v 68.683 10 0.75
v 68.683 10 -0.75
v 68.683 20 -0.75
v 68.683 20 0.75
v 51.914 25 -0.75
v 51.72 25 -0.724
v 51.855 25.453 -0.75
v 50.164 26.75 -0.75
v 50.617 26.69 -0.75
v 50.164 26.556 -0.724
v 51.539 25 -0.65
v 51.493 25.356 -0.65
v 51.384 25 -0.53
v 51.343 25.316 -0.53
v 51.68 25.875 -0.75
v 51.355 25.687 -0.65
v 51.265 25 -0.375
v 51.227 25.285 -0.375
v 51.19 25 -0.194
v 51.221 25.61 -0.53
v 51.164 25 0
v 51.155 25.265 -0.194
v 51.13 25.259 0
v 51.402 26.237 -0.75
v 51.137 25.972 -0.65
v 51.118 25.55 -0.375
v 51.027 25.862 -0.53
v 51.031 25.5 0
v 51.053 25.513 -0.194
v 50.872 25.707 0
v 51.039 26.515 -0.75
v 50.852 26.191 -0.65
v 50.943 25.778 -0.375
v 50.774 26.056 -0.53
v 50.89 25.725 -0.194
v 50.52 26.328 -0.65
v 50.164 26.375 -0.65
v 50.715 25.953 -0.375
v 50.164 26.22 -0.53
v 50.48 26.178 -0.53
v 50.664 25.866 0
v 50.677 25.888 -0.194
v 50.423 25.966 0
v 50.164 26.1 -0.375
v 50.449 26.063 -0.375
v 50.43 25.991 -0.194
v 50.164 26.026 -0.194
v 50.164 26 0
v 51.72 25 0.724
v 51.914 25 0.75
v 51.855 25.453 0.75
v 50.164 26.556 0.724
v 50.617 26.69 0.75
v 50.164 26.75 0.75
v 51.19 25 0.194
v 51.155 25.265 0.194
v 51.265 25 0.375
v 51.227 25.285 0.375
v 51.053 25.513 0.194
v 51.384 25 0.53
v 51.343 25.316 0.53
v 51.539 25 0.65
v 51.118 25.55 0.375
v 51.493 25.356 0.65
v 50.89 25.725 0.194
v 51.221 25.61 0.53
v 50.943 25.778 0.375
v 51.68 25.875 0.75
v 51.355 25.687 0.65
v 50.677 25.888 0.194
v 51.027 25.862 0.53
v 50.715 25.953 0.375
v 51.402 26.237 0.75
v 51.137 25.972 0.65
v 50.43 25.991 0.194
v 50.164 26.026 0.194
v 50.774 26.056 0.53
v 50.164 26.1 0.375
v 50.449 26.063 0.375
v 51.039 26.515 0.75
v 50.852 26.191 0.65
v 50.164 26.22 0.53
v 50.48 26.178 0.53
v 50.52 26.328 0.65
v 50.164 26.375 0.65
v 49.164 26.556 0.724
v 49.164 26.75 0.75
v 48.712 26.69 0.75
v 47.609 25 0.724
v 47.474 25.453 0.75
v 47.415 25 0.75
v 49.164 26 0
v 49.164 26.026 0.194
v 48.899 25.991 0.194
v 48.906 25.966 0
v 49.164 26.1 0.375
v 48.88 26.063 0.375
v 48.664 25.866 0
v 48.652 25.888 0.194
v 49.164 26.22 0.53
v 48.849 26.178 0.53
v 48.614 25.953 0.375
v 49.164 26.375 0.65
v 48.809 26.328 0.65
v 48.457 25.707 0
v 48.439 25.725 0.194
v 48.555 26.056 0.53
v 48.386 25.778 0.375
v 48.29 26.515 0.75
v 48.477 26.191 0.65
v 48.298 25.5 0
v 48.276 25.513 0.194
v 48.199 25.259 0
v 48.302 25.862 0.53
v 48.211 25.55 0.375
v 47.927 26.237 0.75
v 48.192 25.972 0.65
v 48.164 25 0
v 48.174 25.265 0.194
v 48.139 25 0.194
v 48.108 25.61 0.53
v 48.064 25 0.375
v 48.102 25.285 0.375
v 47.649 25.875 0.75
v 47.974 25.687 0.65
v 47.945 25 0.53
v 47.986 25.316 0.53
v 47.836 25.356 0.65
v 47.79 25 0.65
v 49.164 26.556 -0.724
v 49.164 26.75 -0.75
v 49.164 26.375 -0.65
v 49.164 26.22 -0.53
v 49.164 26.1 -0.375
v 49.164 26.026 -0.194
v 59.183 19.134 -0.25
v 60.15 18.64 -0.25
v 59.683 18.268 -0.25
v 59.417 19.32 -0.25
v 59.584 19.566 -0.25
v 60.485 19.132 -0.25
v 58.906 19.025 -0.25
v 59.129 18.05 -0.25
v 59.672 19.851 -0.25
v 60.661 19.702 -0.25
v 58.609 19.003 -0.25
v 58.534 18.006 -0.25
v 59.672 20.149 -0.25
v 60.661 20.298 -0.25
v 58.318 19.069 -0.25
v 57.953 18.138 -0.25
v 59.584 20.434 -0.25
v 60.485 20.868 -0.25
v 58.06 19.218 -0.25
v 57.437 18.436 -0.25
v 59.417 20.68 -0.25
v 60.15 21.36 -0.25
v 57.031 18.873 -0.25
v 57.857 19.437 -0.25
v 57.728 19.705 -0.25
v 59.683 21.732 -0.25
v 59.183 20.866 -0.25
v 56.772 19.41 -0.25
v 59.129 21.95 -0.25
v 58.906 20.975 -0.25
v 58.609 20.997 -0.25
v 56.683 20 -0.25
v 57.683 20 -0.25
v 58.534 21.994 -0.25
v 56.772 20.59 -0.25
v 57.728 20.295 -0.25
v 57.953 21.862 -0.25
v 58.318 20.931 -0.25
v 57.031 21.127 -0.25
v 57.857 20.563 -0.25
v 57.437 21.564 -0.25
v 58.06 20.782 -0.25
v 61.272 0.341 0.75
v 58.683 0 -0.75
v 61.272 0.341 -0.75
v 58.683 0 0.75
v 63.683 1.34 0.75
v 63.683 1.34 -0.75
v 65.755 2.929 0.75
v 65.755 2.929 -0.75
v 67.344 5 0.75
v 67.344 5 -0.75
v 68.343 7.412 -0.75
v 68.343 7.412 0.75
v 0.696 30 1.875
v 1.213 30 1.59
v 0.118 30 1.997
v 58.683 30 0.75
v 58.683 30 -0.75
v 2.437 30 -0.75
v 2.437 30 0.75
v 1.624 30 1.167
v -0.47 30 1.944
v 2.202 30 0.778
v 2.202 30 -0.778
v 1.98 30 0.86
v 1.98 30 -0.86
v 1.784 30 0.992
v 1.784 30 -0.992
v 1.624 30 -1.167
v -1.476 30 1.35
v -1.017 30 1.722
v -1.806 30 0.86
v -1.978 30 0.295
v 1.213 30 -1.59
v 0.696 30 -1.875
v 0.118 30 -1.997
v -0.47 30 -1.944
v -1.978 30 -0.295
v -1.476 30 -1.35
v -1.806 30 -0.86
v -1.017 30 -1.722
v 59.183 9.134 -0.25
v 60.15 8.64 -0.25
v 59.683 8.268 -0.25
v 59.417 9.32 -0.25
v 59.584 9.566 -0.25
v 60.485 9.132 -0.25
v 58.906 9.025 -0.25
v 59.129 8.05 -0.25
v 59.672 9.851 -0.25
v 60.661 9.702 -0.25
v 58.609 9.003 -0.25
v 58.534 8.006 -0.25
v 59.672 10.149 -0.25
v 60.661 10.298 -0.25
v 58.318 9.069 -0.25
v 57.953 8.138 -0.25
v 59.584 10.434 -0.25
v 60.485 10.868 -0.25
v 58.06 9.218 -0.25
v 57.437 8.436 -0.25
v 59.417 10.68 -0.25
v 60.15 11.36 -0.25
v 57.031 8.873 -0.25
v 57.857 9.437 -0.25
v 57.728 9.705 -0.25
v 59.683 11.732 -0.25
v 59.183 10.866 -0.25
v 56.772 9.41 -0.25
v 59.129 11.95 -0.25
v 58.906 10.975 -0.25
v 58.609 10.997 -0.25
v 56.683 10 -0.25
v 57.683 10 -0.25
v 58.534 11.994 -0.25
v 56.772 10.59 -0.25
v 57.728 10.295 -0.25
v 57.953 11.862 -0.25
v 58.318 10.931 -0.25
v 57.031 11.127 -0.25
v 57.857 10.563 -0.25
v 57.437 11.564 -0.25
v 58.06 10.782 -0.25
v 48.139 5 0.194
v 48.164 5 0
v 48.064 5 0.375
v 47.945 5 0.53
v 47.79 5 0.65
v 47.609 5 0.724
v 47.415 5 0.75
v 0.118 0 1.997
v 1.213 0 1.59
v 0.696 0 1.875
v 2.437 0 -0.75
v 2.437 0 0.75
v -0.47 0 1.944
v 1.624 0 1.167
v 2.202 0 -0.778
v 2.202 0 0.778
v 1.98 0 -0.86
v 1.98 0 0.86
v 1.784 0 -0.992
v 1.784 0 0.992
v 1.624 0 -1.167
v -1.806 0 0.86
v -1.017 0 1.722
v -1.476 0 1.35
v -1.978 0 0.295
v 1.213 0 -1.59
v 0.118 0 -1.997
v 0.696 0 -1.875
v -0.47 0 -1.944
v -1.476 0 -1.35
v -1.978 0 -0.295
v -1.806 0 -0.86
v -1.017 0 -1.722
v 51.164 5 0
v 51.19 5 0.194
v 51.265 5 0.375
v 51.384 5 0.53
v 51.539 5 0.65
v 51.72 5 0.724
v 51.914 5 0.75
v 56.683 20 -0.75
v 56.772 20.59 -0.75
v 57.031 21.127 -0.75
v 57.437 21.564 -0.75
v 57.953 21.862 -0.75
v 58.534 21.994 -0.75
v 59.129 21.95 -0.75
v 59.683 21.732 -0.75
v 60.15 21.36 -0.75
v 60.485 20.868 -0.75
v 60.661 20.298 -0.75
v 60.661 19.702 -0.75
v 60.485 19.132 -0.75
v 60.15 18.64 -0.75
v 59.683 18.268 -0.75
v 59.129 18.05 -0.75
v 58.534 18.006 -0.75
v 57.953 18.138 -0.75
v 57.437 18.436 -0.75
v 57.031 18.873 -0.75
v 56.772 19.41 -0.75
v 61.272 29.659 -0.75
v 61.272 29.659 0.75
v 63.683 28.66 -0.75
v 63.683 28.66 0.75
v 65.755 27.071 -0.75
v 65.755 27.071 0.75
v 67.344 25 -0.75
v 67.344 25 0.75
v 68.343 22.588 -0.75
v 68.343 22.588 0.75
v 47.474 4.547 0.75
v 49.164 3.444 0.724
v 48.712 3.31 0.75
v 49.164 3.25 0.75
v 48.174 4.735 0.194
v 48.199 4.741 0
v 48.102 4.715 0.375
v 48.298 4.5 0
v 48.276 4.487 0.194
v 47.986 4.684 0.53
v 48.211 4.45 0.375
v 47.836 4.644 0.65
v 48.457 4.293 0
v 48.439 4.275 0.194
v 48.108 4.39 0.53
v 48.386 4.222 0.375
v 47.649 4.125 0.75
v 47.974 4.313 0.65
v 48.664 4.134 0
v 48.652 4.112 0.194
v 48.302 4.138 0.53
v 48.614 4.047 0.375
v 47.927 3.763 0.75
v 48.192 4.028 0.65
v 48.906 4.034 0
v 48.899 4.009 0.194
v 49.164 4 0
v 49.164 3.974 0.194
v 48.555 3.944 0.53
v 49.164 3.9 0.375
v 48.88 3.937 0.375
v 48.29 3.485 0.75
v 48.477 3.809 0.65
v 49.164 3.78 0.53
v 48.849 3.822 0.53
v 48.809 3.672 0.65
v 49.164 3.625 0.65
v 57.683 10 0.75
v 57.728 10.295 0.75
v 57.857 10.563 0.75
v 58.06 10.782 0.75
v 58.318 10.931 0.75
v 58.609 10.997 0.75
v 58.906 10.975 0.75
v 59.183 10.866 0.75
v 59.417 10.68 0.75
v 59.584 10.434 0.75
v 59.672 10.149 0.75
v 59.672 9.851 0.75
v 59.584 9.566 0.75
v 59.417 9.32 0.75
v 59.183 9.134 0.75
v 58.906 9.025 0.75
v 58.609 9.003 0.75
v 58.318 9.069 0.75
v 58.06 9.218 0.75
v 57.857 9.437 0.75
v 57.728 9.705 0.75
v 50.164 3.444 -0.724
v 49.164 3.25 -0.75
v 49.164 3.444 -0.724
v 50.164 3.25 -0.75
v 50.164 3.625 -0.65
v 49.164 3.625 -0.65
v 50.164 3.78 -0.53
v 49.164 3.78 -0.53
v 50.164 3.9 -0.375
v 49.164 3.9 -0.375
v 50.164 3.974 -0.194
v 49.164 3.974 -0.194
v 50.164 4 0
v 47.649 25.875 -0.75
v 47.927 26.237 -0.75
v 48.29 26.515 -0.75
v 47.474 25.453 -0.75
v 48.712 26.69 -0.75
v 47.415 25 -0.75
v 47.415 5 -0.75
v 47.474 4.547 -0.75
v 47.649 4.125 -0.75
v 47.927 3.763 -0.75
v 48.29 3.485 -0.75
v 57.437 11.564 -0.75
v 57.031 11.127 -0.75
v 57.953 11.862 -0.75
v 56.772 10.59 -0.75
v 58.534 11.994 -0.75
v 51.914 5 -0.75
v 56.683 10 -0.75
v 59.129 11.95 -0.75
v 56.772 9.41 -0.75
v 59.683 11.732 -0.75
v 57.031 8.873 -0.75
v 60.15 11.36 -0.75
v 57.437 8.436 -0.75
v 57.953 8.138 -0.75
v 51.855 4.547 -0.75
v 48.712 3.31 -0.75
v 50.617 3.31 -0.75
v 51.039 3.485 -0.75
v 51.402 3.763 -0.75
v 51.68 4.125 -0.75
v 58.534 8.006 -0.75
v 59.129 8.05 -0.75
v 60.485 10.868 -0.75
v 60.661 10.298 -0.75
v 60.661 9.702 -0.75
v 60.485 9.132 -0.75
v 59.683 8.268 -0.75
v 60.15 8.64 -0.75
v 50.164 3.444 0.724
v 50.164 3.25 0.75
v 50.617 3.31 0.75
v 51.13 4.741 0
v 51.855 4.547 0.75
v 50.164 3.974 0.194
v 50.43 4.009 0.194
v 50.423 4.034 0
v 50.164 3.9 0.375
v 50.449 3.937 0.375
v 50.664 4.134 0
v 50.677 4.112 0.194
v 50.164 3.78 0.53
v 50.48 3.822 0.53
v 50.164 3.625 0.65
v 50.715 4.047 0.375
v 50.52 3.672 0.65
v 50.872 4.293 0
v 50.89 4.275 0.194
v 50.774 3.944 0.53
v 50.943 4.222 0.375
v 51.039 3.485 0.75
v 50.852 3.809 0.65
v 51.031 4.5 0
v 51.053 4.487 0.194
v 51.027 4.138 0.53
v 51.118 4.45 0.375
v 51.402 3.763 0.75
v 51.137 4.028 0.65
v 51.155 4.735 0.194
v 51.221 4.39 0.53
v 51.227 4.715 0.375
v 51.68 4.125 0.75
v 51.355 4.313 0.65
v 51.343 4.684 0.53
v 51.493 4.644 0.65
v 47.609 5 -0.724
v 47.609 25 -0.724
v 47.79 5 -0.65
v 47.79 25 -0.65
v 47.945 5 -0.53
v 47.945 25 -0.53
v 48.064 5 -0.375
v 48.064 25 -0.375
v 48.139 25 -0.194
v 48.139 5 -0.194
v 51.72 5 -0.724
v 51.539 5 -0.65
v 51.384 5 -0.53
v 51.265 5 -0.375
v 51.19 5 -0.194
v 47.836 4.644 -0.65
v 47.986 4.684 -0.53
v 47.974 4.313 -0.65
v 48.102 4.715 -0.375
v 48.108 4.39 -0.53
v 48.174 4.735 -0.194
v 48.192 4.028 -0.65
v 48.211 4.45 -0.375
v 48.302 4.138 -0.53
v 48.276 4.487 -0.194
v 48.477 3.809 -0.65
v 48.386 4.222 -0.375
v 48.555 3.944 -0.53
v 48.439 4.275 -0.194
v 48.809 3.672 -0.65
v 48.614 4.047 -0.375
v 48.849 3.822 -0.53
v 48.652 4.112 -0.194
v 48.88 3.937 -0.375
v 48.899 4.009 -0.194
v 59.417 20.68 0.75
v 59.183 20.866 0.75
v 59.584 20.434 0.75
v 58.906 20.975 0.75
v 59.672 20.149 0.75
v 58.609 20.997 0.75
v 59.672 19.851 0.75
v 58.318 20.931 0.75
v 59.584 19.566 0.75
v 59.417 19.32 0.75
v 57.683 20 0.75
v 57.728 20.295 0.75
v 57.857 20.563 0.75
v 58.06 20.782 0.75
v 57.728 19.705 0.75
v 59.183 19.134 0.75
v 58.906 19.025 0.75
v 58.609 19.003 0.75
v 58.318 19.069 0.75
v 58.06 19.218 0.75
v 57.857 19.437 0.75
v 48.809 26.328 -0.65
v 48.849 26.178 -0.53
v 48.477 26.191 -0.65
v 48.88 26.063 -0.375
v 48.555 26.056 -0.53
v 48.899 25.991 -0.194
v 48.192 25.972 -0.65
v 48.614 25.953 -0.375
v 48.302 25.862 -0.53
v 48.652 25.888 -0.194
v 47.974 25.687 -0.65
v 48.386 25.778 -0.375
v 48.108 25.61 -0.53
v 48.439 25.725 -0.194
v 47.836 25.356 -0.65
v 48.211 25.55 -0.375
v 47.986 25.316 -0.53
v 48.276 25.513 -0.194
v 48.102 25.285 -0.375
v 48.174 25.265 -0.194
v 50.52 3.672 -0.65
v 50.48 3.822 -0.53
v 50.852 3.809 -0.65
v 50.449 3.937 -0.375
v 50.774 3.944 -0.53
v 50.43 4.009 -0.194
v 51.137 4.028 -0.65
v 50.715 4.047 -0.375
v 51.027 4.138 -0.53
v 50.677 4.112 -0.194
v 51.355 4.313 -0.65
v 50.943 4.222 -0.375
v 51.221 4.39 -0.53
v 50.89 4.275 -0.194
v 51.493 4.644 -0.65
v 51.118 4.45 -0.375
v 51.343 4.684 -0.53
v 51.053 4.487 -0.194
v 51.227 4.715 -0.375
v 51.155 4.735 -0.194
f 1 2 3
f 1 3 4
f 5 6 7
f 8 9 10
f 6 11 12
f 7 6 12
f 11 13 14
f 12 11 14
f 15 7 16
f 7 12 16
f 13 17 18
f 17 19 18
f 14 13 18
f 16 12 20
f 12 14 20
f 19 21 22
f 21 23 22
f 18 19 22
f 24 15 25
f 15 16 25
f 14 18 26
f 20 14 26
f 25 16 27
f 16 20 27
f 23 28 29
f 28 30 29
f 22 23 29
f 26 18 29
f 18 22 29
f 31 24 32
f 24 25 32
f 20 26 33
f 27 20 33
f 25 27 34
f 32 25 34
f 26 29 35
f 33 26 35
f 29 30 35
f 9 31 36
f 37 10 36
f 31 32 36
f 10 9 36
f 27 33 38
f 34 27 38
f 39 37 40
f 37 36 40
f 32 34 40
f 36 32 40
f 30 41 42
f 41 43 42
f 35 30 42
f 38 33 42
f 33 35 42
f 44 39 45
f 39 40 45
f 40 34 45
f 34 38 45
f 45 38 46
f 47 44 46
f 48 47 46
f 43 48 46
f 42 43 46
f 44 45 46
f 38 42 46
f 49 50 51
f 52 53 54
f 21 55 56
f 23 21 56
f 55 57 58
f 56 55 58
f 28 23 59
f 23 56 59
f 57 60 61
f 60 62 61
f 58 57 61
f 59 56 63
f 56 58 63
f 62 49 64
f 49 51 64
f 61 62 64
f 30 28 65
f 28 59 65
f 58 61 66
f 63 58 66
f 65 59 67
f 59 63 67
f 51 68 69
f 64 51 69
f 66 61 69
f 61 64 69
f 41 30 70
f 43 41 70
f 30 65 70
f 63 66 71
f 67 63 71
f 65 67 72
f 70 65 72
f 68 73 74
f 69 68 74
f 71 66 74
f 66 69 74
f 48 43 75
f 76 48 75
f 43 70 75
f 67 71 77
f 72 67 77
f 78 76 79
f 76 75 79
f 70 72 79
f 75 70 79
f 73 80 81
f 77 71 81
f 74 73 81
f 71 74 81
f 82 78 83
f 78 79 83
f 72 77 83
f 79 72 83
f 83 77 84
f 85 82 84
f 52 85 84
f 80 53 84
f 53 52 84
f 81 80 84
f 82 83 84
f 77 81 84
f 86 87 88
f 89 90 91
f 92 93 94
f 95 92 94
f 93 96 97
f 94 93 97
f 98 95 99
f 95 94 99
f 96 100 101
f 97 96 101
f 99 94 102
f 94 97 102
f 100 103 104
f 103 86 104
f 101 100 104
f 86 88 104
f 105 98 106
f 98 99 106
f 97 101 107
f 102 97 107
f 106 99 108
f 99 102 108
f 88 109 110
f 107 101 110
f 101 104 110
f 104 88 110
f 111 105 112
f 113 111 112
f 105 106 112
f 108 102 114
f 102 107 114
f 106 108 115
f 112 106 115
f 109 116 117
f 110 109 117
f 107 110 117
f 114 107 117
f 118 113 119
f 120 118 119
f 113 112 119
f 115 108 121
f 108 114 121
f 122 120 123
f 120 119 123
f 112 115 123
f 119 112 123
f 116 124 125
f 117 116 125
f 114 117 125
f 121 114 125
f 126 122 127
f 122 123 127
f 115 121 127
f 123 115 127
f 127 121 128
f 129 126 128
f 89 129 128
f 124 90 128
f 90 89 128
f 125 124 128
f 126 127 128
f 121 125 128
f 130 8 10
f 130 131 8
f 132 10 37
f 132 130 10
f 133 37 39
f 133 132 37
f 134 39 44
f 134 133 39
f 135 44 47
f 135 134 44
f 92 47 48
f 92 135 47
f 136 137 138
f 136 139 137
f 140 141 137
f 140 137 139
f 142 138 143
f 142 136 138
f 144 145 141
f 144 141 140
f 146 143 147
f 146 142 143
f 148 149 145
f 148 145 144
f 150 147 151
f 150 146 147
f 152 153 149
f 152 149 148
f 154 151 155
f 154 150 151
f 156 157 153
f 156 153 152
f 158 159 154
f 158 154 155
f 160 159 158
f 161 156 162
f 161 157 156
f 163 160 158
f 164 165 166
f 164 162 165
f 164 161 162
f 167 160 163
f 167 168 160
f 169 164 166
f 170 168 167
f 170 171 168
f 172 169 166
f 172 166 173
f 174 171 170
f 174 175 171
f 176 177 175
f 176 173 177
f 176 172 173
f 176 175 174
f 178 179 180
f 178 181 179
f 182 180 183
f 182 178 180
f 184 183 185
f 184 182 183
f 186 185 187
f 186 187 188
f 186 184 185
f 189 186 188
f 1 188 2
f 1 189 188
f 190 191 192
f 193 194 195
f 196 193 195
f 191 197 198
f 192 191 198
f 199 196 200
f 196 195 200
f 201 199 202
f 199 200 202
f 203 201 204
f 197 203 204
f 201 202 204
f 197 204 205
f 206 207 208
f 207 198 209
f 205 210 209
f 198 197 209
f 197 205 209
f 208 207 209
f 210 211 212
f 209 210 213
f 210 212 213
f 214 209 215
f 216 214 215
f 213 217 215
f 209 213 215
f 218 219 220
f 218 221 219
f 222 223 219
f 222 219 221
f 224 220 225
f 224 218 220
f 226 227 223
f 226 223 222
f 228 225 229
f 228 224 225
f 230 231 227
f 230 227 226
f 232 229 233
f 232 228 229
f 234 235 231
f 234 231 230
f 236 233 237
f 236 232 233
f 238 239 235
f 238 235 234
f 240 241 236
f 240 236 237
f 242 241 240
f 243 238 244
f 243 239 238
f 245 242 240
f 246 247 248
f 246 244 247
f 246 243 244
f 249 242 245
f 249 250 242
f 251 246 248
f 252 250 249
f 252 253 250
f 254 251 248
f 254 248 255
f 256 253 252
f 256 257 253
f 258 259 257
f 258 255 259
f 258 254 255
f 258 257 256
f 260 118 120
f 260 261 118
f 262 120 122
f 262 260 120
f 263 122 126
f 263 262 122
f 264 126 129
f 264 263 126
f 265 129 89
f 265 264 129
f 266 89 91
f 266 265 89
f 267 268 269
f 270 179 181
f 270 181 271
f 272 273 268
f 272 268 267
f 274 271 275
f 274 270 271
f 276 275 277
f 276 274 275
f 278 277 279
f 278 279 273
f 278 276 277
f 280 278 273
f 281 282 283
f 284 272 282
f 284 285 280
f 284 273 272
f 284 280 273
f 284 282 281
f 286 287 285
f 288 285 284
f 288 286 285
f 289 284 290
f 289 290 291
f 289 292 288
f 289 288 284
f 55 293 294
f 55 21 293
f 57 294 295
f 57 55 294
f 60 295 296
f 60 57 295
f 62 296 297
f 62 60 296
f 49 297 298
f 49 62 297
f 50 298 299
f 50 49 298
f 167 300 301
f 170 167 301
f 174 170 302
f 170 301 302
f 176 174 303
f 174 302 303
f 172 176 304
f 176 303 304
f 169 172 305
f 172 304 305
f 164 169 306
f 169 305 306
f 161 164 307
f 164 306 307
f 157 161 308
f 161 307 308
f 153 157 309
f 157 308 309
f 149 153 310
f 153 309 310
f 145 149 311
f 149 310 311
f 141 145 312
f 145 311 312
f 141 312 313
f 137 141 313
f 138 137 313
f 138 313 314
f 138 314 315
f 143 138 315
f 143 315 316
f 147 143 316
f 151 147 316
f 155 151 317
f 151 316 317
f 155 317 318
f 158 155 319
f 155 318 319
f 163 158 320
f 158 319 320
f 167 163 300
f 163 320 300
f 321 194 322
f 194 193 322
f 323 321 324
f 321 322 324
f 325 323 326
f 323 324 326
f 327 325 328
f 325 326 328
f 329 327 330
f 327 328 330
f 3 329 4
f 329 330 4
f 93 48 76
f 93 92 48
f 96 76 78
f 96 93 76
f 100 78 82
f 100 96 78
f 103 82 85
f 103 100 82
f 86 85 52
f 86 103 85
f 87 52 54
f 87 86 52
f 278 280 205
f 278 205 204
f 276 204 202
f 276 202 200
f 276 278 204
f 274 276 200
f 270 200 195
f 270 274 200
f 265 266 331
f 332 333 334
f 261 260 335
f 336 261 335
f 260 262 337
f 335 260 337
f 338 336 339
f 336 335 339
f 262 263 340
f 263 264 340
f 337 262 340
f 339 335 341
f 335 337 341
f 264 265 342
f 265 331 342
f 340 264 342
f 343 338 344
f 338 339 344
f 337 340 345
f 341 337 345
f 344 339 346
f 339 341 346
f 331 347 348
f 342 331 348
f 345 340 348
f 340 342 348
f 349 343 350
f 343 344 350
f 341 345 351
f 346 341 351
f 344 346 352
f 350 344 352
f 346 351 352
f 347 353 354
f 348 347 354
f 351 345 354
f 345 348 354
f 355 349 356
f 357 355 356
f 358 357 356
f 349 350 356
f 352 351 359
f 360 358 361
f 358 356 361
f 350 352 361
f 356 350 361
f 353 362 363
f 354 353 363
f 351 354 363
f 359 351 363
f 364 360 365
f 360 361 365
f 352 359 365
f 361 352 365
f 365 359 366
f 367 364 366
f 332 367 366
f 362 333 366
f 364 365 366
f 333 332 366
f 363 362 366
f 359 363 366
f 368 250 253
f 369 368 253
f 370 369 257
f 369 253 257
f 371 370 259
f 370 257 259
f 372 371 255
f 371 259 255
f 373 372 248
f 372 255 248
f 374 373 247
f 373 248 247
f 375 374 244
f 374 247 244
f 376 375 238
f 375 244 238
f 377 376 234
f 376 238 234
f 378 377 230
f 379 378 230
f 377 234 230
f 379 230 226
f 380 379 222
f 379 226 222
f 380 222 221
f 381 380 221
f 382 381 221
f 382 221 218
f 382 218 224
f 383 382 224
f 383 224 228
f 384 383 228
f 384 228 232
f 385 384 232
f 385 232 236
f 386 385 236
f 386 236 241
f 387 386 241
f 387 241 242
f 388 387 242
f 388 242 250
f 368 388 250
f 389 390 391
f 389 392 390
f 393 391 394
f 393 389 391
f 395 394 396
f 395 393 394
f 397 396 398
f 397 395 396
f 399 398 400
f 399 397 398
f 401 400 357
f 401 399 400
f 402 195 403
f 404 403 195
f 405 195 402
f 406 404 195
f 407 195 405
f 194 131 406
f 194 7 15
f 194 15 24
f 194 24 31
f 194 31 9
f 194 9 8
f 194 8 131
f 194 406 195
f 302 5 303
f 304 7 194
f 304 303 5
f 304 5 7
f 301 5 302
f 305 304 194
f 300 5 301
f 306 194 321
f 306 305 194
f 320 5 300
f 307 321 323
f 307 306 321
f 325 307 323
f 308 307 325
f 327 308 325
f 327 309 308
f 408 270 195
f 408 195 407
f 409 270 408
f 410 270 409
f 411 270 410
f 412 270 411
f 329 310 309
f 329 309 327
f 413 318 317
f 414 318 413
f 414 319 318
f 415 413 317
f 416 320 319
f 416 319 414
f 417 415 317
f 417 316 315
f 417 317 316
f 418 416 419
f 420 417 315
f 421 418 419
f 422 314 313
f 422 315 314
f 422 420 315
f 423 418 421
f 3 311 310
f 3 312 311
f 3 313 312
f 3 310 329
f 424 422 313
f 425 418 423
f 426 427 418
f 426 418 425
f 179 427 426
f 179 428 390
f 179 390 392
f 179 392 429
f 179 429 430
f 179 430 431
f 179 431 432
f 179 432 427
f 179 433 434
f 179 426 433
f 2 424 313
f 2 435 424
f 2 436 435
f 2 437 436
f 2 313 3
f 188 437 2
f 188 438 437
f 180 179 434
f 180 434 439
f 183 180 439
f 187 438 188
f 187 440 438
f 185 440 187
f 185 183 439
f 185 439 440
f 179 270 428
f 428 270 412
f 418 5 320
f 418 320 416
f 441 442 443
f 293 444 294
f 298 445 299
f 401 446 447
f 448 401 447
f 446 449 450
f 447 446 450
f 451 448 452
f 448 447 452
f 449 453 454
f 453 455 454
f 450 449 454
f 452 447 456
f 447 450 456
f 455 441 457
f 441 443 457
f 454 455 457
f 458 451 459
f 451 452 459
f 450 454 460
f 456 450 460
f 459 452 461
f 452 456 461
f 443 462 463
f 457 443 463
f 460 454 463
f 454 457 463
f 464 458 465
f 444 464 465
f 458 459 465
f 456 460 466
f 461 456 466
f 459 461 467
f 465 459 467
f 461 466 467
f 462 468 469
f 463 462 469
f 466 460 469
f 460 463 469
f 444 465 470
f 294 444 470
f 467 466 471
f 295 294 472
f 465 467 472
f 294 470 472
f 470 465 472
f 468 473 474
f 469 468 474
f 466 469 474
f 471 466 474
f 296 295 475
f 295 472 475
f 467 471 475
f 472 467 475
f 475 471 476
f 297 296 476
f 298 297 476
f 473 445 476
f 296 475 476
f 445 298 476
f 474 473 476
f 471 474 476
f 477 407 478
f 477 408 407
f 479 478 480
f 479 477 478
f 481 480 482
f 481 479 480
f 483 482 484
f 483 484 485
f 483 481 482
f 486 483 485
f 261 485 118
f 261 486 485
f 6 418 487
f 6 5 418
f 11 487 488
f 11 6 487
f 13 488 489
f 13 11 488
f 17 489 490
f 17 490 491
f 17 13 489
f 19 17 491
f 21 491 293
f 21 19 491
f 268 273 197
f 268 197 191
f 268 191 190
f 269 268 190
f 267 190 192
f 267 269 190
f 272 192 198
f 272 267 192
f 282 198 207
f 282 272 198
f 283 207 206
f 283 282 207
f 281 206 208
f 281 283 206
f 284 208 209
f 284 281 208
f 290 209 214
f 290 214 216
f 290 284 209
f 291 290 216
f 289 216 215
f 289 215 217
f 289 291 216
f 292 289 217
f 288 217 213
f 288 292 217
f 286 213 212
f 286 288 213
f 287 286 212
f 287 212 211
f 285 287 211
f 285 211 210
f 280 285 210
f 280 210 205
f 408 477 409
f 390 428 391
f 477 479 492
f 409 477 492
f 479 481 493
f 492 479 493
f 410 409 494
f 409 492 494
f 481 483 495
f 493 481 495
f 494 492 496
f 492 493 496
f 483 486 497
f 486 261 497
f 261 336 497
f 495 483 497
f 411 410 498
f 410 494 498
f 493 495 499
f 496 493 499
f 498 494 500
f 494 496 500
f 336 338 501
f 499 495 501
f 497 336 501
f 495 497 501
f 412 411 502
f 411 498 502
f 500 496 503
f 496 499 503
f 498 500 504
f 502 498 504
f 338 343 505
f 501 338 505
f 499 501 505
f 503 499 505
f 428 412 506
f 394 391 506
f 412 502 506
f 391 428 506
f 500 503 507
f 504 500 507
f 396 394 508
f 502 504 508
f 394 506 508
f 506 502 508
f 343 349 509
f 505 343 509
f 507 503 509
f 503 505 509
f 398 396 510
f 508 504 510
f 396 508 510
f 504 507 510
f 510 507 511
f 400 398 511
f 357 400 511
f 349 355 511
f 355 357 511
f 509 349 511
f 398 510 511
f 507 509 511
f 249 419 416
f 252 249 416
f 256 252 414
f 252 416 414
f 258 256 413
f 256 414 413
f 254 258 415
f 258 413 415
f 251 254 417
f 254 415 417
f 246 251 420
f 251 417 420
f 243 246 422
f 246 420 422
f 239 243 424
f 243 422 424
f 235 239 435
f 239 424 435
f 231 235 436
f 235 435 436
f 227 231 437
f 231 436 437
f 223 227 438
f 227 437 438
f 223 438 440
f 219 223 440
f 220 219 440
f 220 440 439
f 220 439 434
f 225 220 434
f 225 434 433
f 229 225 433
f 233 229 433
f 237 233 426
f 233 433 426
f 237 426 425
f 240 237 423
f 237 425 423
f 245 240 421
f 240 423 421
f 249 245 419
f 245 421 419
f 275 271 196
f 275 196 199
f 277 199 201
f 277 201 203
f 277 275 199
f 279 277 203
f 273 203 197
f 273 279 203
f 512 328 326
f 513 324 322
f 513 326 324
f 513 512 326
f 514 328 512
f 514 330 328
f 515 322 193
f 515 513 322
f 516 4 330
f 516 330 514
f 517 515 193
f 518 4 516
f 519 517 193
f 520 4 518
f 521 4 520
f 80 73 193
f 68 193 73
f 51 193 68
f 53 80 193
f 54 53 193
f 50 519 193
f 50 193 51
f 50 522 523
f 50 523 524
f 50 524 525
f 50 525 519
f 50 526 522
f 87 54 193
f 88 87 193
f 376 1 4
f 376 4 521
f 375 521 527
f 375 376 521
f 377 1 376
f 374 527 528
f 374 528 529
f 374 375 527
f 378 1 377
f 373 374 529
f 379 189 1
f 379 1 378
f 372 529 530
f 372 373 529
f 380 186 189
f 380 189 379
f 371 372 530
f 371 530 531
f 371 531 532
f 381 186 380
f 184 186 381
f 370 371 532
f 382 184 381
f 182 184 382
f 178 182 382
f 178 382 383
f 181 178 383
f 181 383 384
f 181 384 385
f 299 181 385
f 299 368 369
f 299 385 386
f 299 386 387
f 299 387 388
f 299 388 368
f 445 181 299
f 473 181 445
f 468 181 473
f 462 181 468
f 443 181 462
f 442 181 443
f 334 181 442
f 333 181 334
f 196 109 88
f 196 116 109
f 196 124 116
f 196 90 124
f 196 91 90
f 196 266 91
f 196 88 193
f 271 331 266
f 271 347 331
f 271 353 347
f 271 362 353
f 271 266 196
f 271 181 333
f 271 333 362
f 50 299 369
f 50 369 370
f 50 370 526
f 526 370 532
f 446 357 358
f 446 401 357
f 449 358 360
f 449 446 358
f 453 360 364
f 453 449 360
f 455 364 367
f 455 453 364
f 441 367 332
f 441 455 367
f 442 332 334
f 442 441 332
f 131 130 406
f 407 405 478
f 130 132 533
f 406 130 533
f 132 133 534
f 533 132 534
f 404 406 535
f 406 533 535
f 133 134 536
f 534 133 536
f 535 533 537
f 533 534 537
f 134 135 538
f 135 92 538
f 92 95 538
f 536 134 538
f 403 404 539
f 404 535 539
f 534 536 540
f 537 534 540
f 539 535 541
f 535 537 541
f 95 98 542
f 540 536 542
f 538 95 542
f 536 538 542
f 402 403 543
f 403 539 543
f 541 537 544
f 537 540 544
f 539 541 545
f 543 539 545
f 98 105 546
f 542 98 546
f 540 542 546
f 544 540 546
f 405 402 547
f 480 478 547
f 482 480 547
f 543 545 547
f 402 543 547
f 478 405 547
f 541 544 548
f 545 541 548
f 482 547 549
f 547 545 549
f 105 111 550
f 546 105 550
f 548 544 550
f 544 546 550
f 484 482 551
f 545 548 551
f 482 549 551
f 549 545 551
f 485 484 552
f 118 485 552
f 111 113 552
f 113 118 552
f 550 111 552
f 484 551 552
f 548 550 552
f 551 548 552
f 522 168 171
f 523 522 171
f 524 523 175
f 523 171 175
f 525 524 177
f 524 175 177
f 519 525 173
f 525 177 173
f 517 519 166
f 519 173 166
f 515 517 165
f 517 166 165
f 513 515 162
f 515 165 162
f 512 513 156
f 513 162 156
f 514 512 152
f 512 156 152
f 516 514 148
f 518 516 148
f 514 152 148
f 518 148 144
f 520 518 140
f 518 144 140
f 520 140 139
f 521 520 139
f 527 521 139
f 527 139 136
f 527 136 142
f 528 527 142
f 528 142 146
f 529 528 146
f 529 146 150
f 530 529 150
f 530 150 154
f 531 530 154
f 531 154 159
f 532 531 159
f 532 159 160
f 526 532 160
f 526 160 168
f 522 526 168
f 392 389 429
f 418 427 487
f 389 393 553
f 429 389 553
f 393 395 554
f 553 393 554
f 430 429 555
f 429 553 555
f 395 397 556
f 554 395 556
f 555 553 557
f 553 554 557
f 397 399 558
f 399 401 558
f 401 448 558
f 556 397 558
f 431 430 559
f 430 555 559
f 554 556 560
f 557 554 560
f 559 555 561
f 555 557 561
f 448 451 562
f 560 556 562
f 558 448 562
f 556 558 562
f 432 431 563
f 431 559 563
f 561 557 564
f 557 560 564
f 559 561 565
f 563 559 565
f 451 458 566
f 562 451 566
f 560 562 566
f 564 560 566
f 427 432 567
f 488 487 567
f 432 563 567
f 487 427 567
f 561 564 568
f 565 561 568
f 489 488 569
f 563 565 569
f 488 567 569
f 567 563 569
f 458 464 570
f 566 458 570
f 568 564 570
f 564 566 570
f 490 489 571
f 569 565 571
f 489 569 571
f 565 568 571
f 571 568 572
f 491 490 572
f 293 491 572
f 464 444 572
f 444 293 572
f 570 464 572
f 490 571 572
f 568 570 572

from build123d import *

# Parameters (mm, degrees)
BOSS_EXTRUDE1_DEPTH = 30
SKETCH2_W           = 3
SKETCH2_H           = 22
CUT_EXTRUDE1_DEPTH  = 75.999903187
FILLET2_R           = 10
SKETCH5_R           = 2
CUT_EXTRUDE2_DEPTH  = 0.5
SKETCH8_R           = 1
CUT_EXTRUDE3_DEPTH  = 75.983234646
FILLET3_R           = 1
FILLET4_R           = 0.75


with BuildPart() as part:
    # Sketch1 → Boss-Extrude1 (new body)
    with BuildSketch(Plane(origin=(0, 0, 0), x_dir=(1, 0, 0), z_dir=(0, 1, 0))):
        with BuildLine():
            Line((2.436698586, 0.75), (68.683498586, 0.75))
            Line((68.683498586, 0.75), (68.683498586, -0.75))
            Line((68.683498586, -0.75), (2.436698586, -0.75))
            ThreePointArc((2.436698586, -0.75), (1.980263122, -0.860243479), (1.624465724, -1.166666667))
            ThreePointArc((1.624465724, -1.166666667), (-2, 0), (1.624465724, 1.166666667))
            ThreePointArc((1.624465724, 1.166666667), (1.980263122, 0.860243479), (2.436698586, 0.75))
        make_face()
    extrude(amount=BOSS_EXTRUDE1_DEPTH)

    # Sketch2 → Cut-Extrude1 (cut, through all)
    with BuildSketch(Plane.XY.offset(0.75)):
        with Locations((49.664488586, 15)):
            Rectangle(SKETCH2_W, SKETCH2_H)
    extrude(amount=-CUT_EXTRUDE1_DEPTH, mode=Mode.SUBTRACT)

    # Fillet2
    fillet2_edges = [part.edges().sort_by_distance(p)[0] for p in [
        (68.683498586, 30, 0),
        (68.683498586, 0, 0),
    ]]
    fillet(fillet2_edges, radius=FILLET2_R)

    # Sketch5 → Cut-Extrude2 (cut)
    with BuildSketch(Plane(origin=(0, 0, -0.75), x_dir=(-1, 0, 0), z_dir=(0, 0, -1))):
        with Locations((-58.683498586, 20)):
            Circle(SKETCH5_R)
        with Locations((-58.683498586, 10)):
            Circle(SKETCH5_R)
    extrude(amount=-CUT_EXTRUDE2_DEPTH, mode=Mode.SUBTRACT)

    # Sketch8 → Cut-Extrude3 (cut, through all)
    with BuildSketch(Plane(origin=(0, 0, -0.25), x_dir=(-1, 0, 0), z_dir=(0, 0, -1))):
        with Locations((-58.683498586, 20)):
            Circle(SKETCH8_R)
        with Locations((-58.683498586, 10)):
            Circle(SKETCH8_R)
    extrude(amount=-CUT_EXTRUDE3_DEPTH, mode=Mode.SUBTRACT)

    # Fillet3
    fillet3_edges = [part.edges().sort_by_distance(p)[0] for p in [
        (51.164488586, 26, 0),
        (51.164488586, 4, 0),
        (48.164488586, 4, 0),
        (48.164488586, 26, 0),
    ]]
    fillet(fillet3_edges, radius=FILLET3_R)

    # Fillet4
    fillet4_edges = [part.edges().sort_by_distance(p)[0] for p in [
        (48.457381805, 25.707106781, 0.75),
        (49.664488586, 26, 0.75),
        (50.871595367, 25.707106781, 0.75),
        (51.164488586, 15, 0.75),
        (50.871595367, 4.292893219, 0.75),
        (49.664488586, 4, 0.75),
        (48.457381805, 4.292893219, 0.75),
        (48.457381805, 25.707106781, -0.75),
        (49.664488586, 26, -0.75),
        (50.871595367, 25.707106781, -0.75),
        (51.164488586, 15, -0.75),
        (50.871595367, 4.292893219, -0.75),
        (49.664488586, 4, -0.75),
        (48.457381805, 4.292893219, -0.75),
        (48.164488586, 15, 0.75),
        (48.164488586, 15, -0.75),
    ]]
    fillet(fillet4_edges, radius=FILLET4_R - 0.0001)  # a hair under: the kernel refuses the full size


solid = part.part
